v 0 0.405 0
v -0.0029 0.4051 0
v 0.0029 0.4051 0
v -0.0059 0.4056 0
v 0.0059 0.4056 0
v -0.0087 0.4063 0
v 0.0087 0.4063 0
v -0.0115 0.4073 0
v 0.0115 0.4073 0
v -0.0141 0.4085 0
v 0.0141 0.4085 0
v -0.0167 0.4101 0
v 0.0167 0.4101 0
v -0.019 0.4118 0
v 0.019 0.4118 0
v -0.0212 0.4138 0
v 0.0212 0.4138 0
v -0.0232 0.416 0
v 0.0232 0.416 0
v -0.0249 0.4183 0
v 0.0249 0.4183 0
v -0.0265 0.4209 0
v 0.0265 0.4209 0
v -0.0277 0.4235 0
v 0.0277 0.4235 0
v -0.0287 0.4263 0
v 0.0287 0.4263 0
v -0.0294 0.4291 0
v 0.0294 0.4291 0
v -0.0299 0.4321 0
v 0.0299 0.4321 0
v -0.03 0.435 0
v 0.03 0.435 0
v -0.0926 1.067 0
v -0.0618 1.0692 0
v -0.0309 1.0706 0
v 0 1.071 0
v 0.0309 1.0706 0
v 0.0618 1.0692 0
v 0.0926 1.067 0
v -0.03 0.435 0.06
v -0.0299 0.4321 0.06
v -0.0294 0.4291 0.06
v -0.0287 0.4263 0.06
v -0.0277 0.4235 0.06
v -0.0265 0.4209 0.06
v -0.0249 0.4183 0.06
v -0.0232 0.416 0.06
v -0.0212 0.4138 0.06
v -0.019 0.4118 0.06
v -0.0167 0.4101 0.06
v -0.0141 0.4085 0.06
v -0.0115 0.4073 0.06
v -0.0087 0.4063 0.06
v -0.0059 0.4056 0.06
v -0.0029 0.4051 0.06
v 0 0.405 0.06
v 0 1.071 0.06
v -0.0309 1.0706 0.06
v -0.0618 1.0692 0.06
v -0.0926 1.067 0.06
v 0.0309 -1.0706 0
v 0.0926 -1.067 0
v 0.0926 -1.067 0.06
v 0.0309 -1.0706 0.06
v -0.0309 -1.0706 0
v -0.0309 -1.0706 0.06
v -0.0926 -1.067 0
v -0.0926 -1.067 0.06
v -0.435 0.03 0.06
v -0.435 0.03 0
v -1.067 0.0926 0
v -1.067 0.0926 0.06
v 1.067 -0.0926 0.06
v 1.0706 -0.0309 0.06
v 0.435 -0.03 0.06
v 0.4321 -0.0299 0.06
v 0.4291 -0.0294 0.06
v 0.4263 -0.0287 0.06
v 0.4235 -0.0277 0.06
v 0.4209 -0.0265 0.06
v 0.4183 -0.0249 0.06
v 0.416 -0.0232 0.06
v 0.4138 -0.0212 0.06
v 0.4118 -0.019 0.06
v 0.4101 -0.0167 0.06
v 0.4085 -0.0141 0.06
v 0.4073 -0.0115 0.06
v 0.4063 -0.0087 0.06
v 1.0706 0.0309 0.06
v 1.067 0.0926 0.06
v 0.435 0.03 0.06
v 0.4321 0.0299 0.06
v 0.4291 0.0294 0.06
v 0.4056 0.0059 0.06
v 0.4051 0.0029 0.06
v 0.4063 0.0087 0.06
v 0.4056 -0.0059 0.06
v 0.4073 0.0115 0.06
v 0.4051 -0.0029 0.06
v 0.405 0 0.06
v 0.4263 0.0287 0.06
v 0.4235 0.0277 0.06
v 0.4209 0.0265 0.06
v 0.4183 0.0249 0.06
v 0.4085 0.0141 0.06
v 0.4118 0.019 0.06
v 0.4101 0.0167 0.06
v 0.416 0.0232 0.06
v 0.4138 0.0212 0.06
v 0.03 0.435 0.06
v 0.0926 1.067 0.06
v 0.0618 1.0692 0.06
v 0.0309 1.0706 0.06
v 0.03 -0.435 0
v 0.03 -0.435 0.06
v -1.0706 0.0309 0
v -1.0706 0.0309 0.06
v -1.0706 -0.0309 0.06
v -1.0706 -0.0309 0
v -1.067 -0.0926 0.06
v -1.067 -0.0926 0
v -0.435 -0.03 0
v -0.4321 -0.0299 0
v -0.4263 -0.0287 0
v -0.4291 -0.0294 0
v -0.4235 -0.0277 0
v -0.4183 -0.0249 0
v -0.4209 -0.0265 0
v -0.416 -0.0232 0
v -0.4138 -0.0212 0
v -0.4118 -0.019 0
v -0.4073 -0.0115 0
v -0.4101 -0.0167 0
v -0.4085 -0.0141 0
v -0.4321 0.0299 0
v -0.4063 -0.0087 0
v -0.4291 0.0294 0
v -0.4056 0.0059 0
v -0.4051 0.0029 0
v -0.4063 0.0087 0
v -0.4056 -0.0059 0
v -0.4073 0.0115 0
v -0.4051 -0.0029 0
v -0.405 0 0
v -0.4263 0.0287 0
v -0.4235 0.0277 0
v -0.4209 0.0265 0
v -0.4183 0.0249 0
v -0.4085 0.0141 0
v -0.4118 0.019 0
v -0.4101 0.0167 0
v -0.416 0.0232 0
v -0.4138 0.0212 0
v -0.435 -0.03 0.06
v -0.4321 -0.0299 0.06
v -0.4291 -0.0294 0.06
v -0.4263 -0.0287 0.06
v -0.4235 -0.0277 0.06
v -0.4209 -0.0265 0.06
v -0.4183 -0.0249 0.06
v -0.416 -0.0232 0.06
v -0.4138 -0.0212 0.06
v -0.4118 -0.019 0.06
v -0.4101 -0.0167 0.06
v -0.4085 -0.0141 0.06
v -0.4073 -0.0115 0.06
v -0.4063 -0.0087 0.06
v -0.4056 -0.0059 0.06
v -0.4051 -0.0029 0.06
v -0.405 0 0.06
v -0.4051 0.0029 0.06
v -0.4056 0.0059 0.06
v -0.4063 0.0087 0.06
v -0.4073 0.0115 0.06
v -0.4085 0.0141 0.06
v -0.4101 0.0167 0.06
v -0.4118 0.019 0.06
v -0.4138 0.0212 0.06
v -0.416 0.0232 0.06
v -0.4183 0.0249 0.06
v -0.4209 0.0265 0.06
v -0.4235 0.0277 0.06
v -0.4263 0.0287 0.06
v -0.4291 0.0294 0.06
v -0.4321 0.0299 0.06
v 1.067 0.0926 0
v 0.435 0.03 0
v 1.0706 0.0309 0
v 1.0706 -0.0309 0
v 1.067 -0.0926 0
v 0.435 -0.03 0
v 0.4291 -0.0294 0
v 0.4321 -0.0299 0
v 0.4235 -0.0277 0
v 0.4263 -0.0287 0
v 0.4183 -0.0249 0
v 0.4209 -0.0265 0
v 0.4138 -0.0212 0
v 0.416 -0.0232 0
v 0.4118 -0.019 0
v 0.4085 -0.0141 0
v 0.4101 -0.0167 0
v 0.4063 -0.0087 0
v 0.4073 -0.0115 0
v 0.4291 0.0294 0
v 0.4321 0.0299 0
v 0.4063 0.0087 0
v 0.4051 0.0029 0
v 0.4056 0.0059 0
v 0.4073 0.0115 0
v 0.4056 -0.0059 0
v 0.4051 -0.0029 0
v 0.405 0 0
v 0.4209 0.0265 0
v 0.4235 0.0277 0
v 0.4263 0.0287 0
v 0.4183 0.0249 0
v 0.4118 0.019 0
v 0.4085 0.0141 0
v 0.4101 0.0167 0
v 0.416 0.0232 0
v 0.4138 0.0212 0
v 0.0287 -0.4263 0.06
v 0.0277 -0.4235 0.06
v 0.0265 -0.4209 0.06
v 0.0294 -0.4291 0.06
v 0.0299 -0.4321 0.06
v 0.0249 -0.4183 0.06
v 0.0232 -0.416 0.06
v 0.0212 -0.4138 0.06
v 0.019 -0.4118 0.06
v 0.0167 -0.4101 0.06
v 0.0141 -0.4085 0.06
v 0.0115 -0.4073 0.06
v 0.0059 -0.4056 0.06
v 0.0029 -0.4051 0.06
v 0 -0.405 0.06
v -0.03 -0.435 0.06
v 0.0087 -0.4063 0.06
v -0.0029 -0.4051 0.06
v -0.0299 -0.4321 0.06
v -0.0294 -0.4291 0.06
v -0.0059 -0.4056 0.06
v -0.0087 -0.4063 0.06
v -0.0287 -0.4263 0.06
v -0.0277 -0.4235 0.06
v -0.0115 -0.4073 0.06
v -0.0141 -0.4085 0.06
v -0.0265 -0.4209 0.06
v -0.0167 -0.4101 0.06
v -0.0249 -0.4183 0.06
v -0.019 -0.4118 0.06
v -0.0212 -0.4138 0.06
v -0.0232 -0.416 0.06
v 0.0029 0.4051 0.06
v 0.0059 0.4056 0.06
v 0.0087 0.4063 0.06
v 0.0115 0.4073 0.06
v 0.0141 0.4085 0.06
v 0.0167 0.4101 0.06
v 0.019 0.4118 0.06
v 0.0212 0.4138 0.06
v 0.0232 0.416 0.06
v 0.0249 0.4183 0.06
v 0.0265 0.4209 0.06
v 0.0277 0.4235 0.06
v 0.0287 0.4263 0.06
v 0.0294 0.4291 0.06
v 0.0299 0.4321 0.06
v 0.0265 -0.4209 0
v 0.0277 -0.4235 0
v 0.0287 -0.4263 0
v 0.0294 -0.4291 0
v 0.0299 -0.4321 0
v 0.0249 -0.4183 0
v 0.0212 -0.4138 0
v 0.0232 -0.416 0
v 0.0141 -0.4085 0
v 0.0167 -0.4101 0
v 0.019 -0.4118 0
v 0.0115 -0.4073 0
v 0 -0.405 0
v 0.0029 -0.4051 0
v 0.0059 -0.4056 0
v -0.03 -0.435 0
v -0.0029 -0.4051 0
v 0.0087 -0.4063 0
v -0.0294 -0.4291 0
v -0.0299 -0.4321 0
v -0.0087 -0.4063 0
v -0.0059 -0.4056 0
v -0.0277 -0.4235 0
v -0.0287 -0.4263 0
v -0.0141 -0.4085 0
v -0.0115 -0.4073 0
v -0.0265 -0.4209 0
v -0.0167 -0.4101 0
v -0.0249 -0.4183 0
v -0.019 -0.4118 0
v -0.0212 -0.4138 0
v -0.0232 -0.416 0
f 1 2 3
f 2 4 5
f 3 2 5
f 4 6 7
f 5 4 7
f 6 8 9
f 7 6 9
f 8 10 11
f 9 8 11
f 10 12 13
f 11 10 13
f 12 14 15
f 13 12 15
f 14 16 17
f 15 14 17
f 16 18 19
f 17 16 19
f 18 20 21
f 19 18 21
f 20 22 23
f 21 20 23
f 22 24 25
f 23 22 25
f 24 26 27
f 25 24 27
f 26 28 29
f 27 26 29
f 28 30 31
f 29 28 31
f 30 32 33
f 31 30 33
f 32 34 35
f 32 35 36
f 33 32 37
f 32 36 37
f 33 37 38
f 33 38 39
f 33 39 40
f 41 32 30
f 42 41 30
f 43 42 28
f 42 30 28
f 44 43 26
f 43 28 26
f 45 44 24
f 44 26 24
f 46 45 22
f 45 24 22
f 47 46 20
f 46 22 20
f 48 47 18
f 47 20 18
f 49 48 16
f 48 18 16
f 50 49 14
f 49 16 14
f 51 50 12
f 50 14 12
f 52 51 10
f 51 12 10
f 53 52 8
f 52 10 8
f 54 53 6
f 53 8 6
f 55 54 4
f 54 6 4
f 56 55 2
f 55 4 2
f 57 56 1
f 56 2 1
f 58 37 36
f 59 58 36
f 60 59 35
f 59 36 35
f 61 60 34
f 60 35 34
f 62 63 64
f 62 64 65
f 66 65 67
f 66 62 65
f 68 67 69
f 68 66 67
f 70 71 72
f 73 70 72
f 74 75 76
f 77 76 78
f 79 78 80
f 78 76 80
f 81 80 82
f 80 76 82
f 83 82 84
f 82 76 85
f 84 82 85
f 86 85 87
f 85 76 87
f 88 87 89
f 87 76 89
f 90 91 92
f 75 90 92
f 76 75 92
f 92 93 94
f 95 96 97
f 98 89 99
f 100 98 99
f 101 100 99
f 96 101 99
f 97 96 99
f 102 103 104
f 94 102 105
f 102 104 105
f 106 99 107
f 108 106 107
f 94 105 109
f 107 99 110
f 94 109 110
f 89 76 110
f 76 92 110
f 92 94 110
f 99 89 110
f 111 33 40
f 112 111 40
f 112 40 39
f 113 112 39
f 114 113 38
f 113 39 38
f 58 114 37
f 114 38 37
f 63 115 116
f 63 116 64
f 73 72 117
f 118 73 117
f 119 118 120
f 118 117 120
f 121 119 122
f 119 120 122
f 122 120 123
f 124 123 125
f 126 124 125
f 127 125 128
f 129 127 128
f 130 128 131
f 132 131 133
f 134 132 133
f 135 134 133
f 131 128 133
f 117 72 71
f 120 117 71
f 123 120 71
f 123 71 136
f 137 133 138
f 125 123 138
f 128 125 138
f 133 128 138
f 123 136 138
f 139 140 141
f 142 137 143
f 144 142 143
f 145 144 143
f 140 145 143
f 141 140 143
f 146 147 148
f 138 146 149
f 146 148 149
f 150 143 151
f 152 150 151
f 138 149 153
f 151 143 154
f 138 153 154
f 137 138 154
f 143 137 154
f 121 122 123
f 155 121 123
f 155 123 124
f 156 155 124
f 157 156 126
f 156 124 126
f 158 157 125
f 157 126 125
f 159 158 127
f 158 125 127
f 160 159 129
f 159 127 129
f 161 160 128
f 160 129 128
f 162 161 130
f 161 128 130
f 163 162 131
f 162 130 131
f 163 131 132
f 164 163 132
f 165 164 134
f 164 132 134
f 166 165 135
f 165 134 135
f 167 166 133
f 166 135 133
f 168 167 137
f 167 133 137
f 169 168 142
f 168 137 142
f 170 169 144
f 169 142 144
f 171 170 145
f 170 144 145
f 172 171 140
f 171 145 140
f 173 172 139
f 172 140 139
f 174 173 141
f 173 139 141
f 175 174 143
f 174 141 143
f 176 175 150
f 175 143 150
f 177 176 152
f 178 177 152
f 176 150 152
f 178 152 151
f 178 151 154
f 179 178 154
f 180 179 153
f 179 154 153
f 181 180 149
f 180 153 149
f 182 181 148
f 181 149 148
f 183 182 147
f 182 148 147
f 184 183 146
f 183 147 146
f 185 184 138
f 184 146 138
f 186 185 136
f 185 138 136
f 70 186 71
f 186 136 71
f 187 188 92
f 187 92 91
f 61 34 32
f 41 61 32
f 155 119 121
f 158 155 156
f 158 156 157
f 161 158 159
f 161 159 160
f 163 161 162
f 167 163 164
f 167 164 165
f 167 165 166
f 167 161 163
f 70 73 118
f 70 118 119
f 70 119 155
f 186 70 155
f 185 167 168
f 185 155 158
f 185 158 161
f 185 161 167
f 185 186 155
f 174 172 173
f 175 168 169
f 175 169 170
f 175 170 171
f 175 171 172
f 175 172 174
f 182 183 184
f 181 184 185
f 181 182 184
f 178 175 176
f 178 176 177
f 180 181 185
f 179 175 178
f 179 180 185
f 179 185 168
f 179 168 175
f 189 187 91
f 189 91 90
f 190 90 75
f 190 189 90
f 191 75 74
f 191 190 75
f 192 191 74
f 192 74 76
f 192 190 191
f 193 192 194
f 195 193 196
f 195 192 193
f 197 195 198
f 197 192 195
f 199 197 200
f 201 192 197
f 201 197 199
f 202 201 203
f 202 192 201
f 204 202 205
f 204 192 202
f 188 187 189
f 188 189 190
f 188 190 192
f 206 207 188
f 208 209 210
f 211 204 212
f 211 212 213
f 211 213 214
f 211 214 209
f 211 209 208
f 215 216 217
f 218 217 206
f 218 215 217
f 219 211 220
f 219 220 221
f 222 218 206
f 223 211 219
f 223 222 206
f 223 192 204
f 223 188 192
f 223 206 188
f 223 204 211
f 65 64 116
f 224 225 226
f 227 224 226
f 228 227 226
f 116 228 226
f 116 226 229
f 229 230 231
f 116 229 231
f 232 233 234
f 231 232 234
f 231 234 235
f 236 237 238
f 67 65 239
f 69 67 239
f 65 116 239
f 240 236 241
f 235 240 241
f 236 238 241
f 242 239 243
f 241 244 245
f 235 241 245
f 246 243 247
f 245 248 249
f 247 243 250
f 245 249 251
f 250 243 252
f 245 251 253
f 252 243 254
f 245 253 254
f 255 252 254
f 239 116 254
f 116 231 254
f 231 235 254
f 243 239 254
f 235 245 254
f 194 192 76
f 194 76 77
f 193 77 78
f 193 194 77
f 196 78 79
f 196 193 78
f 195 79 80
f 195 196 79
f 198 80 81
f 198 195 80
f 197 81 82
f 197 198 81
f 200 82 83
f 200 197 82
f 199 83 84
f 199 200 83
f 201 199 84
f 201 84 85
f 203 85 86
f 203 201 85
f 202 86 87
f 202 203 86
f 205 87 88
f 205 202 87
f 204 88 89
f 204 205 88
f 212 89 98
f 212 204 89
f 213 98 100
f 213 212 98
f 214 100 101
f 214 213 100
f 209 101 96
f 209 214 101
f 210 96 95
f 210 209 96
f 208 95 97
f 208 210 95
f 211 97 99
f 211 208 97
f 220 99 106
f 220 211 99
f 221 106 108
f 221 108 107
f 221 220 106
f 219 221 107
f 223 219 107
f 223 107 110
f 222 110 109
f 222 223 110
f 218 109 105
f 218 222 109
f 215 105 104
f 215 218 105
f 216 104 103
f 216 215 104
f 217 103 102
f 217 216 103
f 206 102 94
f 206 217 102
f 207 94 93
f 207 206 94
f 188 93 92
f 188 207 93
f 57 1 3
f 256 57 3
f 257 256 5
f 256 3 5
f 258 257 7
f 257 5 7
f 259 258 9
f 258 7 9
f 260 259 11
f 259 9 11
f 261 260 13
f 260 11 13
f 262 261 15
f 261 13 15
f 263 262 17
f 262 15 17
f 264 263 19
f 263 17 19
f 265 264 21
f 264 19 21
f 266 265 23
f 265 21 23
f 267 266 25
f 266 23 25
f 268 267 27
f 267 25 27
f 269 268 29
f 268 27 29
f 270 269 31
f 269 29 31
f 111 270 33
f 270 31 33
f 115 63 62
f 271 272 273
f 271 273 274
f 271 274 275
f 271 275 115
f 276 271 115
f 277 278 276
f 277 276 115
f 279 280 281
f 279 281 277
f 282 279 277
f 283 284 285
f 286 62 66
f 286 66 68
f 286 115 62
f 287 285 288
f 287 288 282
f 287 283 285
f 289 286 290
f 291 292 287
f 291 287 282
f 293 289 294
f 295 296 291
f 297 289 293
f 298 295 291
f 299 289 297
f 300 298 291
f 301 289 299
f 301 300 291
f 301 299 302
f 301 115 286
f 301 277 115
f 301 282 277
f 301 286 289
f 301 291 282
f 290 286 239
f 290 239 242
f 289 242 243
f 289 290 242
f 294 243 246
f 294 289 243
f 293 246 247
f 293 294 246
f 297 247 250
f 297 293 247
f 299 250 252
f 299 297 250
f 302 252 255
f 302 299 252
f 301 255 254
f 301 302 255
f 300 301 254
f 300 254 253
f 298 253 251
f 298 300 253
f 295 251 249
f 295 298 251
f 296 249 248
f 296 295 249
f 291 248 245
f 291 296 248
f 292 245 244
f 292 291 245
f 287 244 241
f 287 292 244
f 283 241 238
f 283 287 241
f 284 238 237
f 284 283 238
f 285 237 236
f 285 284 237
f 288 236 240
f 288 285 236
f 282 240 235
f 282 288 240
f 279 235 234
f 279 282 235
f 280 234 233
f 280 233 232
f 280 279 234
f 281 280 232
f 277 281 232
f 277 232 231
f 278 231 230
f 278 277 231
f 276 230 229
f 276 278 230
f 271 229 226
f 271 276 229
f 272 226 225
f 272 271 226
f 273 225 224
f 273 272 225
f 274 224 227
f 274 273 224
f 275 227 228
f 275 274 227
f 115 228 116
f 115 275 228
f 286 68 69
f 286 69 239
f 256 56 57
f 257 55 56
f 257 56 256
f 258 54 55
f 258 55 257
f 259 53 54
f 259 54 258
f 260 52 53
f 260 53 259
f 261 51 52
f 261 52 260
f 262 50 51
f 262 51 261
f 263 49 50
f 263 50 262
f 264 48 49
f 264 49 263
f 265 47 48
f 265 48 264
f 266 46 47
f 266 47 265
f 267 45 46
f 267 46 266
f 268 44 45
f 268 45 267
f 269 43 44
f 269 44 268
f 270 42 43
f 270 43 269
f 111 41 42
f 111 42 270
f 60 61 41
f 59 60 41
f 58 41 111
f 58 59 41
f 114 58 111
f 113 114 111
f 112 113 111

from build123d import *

# Parameters (mm, degrees)
EXTRUDE_1_DEPTH = 0.06


with BuildPart() as part:
    # 草圖1 → 填料-伸長1 (new body)
    with BuildSketch(Plane.XY):
        with BuildLine():
            ThreePointArc((-0.03, 0.435), (-0.021213203, 0.413786797), (0, 0.405))
            Line((0, 0.405), (0, 1.071017839))
            ThreePointArc((0, 1.071017839), (-0.046361859, 1.07001392), (-0.092636803, 1.067004046))
            Line((-0.092636803, 1.067004046), (-0.03, 0.435))
        make_face()
        with BuildLine():
            Line((0, 1.071017839), (0, 0.405))
            ThreePointArc((0, 0.405), (0.021213203, 0.413786797), (0.03, 0.435))
            Line((0.03, 0.435), (0.092636803, 1.067004046))
            ThreePointArc((0.092636803, 1.067004046), (0.046361859, 1.07001392), (0, 1.071017839))
        make_face()
        with BuildLine():
            ThreePointArc((-0.435, -0.03), (-0.405, 0), (-0.435, 0.03))
            Line((-0.435, 0.03), (-1.067004046, 0.092636803))
            ThreePointArc((-1.067004046, 0.092636803), (-1.071017839, 0), (-1.067004046, -0.092636803))
            Line((-1.067004046, -0.092636803), (-0.435, -0.03))
        make_face()
        with BuildLine():
            Line((0.03, -0.435), (0.092636803, -1.067004046))
            ThreePointArc((0.092636803, -1.067004046), (0, -1.071017839), (-0.092636803, -1.067004046))
            Line((-0.092636803, -1.067004046), (-0.03, -0.435))
            ThreePointArc((-0.03, -0.435), (0, -0.405), (0.03, -0.435))
        make_face()
        with BuildLine():
            Line((0.435, 0.03), (1.067004046, 0.092636803))
            ThreePointArc((1.067004046, 0.092636803), (1.071017839, 0), (1.067004046, -0.092636803))
            Line((1.067004046, -0.092636803), (0.435, -0.03))
            ThreePointArc((0.435, -0.03), (0.405, 0), (0.435, 0.03))
        make_face()
    extrude(amount=EXTRUDE_1_DEPTH)


solid = part.part
